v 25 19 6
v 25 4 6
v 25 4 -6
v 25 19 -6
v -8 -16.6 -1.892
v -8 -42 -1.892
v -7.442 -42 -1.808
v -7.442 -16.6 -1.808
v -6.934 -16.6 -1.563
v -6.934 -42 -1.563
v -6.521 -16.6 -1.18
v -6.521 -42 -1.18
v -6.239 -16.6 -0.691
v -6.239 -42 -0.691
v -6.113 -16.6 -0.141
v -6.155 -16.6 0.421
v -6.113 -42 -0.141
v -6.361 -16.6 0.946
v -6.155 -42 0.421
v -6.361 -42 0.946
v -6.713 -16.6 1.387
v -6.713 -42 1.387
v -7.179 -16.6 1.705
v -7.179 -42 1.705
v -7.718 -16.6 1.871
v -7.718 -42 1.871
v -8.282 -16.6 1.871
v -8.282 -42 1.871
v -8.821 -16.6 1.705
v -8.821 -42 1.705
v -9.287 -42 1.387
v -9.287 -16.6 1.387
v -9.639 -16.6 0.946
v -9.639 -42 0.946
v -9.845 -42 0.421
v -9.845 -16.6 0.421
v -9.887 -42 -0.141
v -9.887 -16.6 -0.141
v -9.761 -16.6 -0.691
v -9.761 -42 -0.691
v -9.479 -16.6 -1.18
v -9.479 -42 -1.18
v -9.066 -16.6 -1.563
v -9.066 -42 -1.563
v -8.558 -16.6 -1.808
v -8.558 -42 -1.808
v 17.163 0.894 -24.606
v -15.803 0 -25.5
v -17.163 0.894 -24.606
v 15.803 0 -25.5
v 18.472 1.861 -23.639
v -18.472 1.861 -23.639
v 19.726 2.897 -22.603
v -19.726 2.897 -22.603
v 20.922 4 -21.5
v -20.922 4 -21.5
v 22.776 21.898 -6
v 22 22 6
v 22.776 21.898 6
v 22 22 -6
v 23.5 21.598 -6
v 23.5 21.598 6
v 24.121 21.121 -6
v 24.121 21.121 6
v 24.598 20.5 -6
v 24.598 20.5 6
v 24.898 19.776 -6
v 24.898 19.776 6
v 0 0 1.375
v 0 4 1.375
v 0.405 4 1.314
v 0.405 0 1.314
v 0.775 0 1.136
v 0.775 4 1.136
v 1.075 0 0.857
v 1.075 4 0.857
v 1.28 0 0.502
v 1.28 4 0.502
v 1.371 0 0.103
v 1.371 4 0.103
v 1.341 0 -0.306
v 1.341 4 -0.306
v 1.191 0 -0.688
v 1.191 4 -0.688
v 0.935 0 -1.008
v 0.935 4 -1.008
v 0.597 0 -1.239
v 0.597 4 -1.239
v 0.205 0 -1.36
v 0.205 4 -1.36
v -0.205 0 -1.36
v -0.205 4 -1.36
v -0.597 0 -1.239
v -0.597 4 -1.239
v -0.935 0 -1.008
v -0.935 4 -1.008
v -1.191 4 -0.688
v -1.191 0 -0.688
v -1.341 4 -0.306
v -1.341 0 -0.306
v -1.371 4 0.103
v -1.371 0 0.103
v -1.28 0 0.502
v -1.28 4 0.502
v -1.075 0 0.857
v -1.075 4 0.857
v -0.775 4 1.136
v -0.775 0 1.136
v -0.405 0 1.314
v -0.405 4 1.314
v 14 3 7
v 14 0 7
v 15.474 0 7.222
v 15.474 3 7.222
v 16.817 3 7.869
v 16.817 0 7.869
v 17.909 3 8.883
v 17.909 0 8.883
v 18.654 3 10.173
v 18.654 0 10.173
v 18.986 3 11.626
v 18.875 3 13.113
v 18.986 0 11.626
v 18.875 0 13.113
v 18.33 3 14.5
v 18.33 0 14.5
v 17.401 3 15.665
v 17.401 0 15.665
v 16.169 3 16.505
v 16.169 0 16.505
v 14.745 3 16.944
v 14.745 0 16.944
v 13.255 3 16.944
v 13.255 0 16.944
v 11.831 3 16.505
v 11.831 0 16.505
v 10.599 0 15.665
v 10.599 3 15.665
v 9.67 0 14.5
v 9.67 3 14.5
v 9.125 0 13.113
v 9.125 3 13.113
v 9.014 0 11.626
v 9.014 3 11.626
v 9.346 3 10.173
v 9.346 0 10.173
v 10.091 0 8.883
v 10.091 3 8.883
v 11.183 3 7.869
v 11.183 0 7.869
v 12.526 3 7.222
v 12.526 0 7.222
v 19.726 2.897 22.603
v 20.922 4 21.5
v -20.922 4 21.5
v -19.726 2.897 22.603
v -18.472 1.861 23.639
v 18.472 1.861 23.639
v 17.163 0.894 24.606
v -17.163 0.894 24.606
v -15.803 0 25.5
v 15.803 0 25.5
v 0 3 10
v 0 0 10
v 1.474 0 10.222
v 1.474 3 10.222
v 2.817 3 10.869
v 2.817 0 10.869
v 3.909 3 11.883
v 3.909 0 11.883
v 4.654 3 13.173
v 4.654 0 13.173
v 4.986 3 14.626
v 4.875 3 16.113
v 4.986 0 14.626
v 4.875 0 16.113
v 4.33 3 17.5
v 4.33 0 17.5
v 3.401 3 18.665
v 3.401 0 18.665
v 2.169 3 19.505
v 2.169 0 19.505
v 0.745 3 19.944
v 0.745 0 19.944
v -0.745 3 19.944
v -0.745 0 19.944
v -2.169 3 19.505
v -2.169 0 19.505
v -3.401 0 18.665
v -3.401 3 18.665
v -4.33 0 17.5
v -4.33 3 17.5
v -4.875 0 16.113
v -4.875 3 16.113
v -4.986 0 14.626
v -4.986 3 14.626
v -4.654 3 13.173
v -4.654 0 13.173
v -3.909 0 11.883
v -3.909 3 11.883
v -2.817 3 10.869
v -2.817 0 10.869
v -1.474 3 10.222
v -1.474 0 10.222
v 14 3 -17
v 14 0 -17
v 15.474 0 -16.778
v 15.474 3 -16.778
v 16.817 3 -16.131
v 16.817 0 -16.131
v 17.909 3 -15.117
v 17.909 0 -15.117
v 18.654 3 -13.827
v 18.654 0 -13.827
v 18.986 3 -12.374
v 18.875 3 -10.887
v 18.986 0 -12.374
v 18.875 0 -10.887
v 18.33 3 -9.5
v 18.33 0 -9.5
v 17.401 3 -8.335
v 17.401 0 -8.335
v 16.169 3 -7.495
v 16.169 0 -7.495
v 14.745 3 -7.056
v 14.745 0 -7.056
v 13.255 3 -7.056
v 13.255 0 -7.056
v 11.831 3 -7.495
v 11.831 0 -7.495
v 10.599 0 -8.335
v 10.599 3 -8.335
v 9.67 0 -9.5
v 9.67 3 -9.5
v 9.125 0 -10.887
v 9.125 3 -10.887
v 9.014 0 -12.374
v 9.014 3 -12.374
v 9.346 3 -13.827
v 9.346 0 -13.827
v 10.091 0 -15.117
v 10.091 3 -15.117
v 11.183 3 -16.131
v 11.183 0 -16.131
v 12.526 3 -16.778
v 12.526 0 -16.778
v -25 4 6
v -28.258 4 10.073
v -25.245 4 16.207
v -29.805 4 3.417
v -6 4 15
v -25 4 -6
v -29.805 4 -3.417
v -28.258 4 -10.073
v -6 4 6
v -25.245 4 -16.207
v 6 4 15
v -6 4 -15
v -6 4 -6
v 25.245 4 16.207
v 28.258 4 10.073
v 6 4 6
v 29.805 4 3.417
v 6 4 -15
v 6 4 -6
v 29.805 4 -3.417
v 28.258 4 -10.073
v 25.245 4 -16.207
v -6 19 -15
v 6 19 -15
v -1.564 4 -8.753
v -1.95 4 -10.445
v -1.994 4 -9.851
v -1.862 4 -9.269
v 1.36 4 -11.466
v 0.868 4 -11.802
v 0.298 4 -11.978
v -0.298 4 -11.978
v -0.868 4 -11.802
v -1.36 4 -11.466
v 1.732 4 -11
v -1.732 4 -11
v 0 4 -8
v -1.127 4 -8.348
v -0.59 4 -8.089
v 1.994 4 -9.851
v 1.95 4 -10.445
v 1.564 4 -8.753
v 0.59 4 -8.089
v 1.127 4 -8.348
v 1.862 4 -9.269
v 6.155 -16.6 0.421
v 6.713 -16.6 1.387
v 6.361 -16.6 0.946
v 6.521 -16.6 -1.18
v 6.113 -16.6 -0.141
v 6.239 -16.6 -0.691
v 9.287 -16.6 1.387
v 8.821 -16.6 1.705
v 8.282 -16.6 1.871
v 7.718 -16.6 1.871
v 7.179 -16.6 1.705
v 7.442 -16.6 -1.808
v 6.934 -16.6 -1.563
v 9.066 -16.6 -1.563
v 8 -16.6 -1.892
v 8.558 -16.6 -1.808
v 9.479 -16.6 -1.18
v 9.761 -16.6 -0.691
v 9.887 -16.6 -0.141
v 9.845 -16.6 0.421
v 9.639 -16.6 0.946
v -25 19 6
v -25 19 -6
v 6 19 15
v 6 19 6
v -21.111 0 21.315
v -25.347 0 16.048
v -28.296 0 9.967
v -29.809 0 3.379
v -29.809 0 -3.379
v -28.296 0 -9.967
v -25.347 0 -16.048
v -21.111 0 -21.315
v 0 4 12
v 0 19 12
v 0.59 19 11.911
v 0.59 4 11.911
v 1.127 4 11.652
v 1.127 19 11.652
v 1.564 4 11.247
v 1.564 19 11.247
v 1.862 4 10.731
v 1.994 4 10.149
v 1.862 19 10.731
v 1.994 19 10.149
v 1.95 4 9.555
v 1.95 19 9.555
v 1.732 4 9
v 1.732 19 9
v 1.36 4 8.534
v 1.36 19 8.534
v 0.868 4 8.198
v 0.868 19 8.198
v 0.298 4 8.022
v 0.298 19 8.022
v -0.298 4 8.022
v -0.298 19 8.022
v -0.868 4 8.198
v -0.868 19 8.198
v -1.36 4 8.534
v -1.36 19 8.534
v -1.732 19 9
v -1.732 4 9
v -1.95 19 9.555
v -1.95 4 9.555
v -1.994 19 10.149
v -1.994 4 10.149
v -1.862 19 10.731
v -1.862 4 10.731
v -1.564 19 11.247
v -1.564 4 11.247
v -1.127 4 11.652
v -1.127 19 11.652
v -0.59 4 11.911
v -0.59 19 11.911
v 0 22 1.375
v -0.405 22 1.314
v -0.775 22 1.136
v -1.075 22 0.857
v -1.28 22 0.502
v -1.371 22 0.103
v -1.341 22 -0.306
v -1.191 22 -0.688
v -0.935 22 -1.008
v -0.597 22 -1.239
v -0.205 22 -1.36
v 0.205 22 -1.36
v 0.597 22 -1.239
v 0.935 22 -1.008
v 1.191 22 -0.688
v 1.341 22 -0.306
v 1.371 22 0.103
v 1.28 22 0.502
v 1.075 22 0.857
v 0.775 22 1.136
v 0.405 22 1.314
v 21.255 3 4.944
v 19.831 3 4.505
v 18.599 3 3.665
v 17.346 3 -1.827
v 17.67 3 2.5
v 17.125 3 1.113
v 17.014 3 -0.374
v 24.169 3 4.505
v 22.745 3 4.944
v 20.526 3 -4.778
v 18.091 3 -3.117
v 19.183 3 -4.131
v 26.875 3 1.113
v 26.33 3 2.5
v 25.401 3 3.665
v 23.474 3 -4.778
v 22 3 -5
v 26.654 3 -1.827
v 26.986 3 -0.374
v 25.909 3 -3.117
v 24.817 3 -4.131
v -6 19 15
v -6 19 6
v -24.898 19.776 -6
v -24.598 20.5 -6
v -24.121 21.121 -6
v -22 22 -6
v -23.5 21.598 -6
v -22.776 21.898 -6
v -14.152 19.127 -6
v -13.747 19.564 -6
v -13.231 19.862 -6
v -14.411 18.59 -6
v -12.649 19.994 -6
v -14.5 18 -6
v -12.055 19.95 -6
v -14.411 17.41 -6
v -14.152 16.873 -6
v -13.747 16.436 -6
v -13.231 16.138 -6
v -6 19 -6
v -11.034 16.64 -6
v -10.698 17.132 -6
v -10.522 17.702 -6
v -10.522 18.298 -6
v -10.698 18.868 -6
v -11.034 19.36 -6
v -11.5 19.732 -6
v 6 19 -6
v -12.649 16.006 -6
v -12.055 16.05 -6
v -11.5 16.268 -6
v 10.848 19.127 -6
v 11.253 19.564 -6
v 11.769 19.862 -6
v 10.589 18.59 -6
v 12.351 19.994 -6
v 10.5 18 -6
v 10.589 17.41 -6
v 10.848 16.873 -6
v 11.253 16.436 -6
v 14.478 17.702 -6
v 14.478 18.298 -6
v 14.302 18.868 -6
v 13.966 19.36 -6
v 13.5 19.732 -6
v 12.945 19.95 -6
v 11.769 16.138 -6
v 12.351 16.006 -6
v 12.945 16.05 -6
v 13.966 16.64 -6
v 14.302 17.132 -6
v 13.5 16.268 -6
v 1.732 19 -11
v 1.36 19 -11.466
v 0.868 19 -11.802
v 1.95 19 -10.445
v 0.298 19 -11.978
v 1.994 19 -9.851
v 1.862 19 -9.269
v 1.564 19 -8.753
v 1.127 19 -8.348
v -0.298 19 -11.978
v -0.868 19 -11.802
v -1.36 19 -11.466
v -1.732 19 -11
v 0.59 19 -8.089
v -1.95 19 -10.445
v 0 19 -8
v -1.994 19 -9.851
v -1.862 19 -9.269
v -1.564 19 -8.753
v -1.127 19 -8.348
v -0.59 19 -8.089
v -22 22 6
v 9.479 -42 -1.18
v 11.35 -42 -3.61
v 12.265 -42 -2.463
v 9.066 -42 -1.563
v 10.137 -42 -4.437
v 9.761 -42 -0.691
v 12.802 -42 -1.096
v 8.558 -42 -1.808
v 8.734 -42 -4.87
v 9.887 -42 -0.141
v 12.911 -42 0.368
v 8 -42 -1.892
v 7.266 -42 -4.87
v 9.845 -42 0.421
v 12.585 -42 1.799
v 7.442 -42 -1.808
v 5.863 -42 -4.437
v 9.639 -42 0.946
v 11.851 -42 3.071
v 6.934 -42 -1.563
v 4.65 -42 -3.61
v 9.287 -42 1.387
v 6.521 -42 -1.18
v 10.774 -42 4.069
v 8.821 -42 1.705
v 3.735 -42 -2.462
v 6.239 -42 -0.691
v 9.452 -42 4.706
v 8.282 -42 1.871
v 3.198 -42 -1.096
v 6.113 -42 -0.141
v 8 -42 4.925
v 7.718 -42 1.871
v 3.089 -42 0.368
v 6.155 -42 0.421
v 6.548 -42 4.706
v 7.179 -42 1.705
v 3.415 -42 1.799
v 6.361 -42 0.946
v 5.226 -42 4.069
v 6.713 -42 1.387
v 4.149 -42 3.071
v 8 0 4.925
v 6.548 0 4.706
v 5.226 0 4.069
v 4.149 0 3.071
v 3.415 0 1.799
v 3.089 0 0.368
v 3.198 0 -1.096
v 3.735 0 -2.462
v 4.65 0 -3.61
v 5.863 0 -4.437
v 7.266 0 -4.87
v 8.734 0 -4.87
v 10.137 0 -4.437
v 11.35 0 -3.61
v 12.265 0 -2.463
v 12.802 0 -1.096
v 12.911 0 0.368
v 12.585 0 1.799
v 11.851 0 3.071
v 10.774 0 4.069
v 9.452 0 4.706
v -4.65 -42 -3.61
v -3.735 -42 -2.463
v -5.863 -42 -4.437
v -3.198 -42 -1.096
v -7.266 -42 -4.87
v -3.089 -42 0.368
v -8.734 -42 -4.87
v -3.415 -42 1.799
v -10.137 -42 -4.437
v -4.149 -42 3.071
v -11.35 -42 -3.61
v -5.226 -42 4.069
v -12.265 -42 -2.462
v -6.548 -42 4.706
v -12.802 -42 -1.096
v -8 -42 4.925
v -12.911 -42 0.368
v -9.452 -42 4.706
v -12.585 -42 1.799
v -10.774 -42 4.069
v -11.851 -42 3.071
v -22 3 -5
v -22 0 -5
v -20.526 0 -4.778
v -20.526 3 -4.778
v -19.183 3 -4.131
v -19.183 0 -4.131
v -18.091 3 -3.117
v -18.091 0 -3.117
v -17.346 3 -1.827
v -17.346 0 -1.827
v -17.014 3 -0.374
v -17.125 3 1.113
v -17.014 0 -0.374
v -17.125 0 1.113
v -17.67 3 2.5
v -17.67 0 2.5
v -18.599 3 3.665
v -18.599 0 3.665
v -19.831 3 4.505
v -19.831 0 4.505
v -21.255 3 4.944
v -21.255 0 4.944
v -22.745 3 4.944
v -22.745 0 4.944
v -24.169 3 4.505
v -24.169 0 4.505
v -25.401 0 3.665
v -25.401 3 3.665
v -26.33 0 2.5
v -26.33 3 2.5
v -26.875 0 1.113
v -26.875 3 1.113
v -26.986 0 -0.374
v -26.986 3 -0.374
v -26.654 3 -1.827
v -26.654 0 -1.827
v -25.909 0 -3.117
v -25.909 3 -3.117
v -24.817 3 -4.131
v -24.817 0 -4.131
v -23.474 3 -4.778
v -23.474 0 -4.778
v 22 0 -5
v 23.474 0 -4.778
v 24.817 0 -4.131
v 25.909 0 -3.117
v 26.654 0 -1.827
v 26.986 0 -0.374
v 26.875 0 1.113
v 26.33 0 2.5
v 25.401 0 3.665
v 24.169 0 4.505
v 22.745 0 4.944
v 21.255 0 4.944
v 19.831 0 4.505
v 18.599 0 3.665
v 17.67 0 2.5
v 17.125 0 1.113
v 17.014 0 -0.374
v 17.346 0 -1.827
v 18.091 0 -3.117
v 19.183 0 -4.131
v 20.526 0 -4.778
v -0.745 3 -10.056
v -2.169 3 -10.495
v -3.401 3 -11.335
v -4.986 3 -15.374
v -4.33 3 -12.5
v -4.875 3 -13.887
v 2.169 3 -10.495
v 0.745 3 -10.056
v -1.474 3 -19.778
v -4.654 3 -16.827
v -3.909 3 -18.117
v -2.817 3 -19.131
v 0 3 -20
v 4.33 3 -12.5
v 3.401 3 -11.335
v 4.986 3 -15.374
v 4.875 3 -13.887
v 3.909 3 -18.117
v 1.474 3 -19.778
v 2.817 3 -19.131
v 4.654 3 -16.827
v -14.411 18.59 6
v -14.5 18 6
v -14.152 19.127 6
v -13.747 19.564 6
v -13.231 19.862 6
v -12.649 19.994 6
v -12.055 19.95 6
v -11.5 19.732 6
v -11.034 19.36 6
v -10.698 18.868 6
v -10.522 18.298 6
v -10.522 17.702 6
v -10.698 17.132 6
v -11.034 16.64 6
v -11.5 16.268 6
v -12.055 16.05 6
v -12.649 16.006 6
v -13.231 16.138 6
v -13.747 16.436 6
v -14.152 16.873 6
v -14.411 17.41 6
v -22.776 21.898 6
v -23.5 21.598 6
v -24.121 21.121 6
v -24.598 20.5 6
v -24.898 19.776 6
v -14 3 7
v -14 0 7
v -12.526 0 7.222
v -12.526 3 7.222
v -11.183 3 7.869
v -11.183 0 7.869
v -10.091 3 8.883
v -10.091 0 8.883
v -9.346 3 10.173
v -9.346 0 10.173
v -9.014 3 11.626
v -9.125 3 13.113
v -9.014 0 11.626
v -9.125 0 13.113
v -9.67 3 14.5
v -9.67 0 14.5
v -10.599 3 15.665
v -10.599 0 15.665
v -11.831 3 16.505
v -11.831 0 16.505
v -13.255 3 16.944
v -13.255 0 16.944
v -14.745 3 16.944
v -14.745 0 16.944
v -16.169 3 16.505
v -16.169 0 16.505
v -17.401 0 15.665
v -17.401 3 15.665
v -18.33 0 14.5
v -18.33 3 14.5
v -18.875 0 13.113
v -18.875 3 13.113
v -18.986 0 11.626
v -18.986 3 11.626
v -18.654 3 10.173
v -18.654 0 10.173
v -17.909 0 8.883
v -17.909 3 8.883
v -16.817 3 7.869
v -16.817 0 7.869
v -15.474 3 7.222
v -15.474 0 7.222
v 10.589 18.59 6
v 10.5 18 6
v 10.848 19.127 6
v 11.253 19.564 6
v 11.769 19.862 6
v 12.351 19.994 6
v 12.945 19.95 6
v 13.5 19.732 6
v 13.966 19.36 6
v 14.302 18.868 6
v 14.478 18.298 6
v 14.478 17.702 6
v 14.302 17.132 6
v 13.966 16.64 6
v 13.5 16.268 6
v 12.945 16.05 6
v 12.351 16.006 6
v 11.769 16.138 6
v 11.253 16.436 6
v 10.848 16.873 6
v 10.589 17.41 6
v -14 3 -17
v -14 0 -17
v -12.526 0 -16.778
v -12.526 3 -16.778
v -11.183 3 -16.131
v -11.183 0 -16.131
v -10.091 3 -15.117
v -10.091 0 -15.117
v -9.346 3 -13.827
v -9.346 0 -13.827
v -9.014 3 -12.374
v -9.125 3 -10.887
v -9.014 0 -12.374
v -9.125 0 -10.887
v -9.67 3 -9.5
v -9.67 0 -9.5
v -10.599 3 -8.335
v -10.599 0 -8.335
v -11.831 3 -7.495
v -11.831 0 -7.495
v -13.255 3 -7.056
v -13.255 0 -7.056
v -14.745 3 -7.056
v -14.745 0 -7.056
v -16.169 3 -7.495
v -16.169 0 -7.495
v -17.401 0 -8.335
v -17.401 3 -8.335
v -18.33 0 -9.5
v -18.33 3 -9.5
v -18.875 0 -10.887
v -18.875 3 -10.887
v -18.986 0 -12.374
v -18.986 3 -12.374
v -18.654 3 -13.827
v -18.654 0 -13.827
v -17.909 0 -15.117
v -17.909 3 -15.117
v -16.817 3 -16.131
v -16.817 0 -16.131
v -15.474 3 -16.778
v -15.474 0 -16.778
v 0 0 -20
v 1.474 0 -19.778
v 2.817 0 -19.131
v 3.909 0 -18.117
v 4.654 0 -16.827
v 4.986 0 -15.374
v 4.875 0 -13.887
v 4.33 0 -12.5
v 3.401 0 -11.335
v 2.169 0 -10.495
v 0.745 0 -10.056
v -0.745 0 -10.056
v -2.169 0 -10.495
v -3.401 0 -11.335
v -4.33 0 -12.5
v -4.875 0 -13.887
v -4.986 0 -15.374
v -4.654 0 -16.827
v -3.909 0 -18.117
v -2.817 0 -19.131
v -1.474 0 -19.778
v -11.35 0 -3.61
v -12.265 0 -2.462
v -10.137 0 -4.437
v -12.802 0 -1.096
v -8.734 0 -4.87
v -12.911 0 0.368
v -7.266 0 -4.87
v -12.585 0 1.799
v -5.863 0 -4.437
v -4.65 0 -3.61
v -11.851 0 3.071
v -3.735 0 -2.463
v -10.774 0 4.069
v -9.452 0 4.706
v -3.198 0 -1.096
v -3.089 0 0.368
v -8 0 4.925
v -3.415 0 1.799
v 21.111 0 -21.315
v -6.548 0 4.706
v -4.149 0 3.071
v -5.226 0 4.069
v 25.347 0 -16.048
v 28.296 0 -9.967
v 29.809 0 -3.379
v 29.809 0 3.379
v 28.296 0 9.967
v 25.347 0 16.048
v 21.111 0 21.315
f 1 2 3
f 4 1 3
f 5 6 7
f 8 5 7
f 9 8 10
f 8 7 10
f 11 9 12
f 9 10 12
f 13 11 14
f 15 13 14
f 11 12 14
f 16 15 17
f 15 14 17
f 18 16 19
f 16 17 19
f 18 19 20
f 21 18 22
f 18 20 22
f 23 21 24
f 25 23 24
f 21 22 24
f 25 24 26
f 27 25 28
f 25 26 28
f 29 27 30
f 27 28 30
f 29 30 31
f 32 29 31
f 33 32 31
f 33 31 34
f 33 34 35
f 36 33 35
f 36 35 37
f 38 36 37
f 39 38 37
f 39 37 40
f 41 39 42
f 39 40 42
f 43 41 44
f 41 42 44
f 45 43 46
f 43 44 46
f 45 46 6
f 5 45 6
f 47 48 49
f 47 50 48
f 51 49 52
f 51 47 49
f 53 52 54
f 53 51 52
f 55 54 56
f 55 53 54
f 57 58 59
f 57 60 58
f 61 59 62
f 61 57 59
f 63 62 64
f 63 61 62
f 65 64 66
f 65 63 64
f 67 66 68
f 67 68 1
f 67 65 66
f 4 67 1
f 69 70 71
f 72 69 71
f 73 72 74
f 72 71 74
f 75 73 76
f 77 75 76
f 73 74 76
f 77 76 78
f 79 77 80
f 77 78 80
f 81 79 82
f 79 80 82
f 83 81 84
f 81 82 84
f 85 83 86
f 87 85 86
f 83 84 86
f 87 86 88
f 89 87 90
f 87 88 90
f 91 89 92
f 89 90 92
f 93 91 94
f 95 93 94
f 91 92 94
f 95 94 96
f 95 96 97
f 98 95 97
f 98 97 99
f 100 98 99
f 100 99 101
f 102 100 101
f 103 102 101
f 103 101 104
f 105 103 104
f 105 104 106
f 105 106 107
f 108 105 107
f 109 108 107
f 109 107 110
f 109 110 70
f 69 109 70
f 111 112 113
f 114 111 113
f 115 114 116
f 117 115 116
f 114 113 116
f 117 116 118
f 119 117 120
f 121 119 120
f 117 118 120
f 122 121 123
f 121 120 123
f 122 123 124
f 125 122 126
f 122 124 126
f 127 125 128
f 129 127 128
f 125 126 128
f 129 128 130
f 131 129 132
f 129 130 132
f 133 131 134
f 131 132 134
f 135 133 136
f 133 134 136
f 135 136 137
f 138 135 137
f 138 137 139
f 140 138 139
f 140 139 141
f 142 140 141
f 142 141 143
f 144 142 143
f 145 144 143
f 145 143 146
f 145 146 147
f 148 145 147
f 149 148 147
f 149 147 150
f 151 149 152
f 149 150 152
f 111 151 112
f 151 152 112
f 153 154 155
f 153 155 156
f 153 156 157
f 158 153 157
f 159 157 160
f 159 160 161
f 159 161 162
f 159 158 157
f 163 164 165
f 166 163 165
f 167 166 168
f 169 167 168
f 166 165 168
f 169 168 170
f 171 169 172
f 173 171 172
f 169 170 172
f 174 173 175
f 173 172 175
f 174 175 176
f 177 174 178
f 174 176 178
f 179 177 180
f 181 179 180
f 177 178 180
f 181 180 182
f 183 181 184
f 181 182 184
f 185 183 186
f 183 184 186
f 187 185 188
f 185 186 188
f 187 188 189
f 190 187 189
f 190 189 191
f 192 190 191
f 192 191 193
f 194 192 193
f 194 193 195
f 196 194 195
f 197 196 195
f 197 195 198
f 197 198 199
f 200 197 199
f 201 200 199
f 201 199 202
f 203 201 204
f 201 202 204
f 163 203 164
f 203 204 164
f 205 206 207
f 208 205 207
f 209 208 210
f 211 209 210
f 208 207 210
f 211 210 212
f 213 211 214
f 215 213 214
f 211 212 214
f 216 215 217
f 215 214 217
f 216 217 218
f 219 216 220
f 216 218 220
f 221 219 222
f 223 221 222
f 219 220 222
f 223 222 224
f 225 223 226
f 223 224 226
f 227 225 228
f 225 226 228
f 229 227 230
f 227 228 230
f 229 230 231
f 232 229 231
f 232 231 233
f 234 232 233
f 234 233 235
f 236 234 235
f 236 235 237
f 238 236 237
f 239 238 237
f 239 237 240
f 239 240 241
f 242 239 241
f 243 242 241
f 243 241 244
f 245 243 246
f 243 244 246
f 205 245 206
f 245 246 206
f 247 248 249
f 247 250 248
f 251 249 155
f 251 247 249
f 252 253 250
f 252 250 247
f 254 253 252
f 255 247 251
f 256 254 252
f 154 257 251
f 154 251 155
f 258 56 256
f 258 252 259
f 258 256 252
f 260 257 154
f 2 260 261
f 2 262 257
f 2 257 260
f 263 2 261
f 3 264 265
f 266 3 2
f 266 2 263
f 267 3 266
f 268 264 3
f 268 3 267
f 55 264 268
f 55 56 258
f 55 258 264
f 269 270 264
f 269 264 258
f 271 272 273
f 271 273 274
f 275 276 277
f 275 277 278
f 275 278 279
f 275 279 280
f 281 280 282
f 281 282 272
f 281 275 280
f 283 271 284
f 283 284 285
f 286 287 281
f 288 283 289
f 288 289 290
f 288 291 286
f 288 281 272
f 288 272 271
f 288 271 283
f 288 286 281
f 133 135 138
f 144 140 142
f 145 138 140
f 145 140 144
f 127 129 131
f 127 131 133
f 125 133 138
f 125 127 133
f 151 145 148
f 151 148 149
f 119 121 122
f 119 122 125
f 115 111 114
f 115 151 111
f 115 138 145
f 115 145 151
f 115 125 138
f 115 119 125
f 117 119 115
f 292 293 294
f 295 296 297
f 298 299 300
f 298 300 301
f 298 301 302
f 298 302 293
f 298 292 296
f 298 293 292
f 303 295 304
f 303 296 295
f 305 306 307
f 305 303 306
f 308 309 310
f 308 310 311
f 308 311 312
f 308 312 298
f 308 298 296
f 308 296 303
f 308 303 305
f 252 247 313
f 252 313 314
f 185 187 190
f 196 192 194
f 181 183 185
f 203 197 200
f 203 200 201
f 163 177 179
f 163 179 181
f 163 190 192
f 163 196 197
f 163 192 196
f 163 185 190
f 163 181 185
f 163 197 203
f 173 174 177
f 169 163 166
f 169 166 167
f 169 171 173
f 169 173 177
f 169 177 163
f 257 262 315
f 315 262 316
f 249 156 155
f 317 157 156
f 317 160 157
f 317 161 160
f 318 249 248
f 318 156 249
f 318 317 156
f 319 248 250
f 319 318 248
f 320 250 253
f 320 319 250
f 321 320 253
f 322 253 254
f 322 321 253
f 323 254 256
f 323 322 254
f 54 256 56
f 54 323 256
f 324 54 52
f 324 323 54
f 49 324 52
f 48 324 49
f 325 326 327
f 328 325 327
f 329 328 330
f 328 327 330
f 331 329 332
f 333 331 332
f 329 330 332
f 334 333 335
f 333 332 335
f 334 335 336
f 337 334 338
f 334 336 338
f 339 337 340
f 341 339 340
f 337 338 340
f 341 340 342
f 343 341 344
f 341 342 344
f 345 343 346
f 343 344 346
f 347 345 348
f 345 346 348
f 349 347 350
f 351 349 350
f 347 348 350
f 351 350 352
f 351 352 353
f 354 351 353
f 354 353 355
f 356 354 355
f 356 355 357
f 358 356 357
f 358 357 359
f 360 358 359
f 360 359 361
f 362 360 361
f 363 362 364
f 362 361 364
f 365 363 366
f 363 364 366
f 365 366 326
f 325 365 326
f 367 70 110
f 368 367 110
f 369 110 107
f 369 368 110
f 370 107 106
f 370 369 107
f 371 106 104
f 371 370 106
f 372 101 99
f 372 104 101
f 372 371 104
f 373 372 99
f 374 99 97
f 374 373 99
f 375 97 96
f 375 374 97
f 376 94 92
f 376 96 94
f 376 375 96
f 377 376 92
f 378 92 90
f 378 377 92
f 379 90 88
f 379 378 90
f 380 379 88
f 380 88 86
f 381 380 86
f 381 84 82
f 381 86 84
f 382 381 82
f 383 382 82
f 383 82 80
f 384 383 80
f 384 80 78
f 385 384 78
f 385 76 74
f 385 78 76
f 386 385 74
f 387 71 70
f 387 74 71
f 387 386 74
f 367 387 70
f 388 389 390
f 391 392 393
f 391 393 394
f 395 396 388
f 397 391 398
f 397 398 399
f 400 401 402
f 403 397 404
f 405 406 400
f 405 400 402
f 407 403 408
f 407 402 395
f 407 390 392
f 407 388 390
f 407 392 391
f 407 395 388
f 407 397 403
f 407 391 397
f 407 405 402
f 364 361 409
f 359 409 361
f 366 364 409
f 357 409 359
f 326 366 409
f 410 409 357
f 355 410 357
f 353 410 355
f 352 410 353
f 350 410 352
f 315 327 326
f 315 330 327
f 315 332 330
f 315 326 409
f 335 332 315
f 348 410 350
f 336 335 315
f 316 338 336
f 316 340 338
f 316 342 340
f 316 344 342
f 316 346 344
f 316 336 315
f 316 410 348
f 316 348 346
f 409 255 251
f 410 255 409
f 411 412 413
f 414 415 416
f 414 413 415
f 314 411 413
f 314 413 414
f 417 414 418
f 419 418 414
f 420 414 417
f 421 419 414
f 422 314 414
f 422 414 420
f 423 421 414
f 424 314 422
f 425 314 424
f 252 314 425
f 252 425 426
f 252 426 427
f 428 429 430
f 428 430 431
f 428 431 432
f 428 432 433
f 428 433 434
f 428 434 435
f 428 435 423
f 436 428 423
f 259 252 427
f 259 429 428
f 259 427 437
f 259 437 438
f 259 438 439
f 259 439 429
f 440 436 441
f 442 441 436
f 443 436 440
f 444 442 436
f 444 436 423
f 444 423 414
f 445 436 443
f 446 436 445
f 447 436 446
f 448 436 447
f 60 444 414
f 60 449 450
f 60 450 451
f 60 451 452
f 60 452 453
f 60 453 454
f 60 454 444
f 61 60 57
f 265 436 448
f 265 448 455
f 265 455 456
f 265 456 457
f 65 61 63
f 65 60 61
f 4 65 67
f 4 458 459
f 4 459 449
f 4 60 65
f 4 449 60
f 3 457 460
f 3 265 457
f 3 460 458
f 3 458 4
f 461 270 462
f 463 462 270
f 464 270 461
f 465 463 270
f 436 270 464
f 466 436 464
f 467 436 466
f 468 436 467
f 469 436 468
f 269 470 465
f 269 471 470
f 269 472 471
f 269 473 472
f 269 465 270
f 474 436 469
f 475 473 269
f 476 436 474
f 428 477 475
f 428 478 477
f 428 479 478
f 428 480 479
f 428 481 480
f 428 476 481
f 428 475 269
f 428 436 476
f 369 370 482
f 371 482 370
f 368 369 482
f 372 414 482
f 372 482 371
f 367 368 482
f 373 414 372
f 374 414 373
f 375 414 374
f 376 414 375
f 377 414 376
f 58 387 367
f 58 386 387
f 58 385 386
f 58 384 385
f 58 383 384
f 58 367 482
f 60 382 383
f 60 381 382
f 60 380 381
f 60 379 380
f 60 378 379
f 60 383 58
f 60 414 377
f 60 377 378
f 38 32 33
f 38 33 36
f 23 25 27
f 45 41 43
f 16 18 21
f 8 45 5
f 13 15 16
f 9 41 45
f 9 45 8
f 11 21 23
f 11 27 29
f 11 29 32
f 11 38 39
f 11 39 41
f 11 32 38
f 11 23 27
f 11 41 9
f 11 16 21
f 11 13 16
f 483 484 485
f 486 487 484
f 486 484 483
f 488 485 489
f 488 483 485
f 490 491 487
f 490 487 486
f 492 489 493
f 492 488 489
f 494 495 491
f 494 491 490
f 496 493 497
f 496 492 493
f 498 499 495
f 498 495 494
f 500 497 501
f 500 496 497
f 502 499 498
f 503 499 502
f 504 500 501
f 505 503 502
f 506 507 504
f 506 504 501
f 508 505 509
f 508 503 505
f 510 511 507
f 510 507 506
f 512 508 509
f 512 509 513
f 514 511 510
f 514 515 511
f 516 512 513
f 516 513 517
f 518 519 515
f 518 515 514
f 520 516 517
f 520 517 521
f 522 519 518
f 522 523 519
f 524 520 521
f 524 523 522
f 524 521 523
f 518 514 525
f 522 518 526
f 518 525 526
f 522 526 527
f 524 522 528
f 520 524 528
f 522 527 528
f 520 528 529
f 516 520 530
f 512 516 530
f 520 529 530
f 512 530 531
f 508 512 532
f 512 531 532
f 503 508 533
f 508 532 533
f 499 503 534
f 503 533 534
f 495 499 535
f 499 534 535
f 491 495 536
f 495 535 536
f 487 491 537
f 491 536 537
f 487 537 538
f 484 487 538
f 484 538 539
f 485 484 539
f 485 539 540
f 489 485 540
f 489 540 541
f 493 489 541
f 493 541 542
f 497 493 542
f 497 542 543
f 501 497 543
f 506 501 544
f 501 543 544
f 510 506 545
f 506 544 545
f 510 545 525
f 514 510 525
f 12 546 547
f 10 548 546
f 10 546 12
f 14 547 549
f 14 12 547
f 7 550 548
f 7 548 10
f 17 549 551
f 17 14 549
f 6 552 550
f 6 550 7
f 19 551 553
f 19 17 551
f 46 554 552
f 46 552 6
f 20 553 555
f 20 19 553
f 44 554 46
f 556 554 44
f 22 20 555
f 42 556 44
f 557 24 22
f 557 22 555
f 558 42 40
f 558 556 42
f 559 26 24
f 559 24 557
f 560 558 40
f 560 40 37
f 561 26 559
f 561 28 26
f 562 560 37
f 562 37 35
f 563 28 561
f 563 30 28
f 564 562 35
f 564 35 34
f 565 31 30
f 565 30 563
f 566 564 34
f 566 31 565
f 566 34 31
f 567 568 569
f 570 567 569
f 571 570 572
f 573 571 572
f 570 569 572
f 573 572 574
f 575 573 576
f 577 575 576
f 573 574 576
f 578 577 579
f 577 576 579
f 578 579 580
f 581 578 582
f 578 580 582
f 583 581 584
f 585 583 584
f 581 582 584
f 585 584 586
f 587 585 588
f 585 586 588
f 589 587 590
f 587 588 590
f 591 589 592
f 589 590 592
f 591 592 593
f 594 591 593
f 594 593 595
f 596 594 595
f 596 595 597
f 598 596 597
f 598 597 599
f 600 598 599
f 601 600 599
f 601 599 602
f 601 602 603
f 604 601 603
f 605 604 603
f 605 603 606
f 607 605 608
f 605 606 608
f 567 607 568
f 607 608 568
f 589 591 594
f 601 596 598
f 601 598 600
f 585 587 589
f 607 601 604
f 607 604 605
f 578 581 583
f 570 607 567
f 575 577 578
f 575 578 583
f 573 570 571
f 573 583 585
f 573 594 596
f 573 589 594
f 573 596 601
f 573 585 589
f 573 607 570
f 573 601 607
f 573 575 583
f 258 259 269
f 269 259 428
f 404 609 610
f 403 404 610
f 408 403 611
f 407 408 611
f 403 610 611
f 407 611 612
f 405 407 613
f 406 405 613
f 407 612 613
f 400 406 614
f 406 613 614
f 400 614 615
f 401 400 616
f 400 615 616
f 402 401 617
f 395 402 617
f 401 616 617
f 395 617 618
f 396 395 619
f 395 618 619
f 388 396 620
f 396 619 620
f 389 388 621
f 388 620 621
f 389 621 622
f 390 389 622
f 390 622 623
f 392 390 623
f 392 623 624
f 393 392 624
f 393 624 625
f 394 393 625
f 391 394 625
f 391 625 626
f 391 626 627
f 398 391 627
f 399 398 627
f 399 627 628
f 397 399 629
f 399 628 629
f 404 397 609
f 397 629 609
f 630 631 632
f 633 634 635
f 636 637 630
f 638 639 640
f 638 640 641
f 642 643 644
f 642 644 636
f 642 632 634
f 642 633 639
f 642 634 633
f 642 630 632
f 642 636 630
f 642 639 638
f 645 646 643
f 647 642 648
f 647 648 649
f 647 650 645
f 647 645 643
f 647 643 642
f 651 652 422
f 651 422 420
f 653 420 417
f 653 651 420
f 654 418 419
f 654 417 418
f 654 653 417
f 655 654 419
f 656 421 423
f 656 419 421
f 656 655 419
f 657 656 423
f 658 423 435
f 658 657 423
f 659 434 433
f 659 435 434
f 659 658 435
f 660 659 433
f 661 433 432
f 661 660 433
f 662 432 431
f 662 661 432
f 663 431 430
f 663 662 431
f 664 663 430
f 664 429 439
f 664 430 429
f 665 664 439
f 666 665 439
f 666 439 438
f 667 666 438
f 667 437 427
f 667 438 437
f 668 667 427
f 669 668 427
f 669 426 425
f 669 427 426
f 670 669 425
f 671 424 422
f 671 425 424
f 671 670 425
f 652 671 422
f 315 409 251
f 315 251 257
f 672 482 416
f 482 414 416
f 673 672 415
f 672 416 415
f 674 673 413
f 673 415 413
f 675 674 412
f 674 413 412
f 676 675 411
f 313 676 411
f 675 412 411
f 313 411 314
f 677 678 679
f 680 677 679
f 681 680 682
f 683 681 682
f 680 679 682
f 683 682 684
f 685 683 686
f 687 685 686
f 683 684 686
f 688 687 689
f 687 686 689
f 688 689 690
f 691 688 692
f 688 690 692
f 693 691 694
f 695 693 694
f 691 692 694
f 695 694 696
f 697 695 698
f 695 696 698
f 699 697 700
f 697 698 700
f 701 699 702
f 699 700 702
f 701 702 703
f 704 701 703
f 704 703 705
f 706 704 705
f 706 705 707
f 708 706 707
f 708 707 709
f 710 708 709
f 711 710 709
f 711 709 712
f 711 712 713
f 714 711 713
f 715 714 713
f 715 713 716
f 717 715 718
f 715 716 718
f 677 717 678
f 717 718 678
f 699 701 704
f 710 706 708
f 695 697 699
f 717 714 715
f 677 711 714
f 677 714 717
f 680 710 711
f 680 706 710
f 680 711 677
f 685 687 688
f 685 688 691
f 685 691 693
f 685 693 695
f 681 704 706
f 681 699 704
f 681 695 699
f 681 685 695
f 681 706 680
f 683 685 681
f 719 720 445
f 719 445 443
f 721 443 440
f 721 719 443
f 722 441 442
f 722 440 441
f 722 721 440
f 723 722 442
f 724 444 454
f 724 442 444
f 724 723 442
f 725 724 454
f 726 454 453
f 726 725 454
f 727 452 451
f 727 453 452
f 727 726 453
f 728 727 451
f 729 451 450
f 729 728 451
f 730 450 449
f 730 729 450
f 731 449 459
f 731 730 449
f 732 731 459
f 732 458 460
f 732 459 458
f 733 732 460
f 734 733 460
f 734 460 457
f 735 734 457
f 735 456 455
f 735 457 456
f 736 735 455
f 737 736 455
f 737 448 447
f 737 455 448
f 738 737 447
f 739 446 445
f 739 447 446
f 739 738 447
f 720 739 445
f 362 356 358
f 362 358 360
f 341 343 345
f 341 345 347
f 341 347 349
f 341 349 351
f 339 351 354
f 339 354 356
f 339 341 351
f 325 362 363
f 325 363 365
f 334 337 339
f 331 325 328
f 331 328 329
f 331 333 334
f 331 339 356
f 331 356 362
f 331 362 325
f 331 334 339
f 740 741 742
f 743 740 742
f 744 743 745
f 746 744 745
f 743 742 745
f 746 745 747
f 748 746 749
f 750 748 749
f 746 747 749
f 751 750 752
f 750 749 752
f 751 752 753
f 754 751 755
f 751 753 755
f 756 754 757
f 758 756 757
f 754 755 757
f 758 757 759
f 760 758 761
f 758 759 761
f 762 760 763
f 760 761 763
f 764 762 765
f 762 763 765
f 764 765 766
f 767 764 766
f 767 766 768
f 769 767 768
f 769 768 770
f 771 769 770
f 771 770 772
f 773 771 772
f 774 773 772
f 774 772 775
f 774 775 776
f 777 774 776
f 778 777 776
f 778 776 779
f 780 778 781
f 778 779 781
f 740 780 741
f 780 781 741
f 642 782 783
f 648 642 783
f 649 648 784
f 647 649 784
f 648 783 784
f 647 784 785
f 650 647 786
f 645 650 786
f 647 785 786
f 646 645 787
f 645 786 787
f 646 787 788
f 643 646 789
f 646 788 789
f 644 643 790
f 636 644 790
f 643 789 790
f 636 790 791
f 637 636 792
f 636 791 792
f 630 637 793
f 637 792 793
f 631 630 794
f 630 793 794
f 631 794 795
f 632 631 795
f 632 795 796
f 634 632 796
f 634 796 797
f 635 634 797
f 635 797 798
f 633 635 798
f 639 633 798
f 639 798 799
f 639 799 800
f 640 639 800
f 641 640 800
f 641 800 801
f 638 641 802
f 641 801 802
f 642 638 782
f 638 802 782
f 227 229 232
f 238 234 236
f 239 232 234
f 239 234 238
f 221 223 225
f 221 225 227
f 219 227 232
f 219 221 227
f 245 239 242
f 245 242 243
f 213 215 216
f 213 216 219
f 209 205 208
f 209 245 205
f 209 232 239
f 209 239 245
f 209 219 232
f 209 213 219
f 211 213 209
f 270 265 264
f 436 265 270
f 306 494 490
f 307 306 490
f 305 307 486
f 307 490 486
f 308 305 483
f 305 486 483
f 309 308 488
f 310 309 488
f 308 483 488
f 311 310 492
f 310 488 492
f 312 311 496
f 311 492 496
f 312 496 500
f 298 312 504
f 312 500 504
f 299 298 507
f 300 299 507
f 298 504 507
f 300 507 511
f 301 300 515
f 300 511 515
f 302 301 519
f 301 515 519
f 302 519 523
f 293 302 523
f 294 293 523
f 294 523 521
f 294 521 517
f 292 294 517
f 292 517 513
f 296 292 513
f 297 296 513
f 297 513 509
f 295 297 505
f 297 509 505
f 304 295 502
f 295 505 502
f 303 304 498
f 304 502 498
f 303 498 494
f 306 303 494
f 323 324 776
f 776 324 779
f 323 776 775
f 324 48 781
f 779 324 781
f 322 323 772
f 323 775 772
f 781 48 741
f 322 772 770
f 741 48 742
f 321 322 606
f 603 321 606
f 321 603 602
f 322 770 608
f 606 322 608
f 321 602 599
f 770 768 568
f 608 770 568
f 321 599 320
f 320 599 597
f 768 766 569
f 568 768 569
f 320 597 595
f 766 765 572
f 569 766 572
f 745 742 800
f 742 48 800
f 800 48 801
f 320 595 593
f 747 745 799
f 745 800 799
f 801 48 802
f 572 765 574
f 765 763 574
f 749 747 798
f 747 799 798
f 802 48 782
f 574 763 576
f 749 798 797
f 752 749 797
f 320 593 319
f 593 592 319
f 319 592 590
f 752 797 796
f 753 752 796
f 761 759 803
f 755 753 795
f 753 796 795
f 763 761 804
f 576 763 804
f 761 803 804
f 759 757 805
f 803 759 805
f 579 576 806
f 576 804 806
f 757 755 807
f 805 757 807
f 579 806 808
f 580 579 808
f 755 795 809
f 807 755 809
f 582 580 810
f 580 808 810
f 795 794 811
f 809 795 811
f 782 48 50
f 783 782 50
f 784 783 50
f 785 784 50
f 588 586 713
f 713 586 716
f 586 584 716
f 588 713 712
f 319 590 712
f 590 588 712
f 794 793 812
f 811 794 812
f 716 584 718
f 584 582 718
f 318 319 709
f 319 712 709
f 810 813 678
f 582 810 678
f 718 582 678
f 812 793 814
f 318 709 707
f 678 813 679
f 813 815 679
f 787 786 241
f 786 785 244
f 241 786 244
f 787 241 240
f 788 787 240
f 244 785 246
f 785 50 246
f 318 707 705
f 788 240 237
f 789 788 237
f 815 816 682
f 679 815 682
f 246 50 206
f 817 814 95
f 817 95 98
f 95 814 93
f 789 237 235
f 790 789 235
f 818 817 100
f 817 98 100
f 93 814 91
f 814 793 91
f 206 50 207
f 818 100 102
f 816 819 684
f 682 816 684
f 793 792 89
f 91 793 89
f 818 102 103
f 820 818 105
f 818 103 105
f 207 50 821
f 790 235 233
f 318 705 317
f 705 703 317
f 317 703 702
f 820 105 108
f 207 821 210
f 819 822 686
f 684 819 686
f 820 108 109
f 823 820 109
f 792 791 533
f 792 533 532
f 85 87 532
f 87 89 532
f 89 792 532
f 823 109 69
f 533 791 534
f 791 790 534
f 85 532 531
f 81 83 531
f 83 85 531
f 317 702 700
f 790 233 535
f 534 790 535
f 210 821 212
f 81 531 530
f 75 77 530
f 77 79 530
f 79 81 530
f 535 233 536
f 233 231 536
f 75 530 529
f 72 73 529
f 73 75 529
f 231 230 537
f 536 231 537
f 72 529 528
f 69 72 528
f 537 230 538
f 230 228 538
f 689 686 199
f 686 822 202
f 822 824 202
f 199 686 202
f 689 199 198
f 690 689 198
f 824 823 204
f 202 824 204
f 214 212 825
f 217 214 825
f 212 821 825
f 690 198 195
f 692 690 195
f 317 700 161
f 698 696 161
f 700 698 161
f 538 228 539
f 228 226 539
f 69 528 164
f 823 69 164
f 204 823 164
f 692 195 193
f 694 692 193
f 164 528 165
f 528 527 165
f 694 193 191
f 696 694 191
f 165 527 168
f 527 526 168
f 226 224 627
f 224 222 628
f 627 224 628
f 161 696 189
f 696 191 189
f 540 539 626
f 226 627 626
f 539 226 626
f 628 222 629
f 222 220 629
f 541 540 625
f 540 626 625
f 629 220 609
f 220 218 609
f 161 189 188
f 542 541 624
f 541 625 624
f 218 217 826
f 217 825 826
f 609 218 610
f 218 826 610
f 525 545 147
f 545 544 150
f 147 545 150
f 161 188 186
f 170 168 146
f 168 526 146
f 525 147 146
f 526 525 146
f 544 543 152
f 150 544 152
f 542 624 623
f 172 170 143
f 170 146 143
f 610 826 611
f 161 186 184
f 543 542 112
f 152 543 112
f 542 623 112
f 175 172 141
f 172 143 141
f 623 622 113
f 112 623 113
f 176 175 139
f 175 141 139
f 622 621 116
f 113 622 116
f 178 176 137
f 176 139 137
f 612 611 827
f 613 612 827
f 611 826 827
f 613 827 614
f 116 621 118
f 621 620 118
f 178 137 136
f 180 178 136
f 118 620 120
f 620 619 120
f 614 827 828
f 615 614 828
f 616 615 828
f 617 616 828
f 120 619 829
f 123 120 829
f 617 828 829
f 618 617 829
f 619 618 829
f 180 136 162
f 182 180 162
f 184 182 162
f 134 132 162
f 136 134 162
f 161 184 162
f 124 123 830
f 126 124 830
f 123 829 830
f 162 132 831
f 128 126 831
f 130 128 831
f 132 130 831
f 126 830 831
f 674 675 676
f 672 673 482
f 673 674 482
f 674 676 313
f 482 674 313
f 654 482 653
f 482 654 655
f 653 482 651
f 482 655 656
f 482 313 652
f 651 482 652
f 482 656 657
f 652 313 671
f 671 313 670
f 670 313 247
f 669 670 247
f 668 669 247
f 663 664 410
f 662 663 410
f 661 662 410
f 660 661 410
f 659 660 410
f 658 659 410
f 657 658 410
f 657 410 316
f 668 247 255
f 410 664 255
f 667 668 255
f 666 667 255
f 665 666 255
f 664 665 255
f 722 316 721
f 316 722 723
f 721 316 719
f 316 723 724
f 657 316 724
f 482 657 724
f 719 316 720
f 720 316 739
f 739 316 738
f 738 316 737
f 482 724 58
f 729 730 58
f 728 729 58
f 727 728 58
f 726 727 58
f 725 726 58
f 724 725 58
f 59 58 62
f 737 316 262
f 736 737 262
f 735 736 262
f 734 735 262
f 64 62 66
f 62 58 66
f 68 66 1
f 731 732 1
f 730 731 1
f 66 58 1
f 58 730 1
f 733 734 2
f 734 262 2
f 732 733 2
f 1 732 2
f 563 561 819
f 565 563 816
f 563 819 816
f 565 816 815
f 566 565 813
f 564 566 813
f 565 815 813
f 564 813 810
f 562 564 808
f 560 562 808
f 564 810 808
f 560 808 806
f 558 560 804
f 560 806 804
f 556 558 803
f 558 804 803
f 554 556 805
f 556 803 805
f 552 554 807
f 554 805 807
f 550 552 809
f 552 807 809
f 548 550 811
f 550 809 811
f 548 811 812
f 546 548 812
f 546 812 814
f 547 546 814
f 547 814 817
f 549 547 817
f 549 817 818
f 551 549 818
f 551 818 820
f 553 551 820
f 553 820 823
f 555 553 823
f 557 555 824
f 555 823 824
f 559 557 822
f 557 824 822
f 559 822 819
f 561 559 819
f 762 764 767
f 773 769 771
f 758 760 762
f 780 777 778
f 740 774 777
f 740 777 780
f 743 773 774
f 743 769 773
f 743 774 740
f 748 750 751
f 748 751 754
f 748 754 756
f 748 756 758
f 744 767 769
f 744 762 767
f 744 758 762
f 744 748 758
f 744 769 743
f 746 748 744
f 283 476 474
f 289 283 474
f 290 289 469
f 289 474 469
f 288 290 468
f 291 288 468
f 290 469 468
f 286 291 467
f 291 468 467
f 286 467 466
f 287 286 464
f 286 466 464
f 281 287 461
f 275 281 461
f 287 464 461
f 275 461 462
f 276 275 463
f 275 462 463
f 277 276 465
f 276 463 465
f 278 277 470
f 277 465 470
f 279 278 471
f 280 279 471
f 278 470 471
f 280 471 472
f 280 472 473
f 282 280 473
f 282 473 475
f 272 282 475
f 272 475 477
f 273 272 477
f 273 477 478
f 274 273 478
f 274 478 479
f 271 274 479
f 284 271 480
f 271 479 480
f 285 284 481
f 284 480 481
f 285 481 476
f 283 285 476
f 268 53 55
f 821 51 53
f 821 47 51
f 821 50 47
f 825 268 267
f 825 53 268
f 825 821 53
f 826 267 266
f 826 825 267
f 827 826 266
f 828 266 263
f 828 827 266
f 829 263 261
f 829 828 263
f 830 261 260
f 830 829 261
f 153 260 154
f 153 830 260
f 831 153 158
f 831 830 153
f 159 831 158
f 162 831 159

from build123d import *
from build123d.topology import SkipClean

# Parameters (mm, degrees)
SKETCH1_R                            = 30
BOSS_EXTRUDE1_DEPTH                  = 4
BOSS_EXTRUDE2_REACH                  = 44.615
BOSS_EXTRUDE2_END_RADIUS             = 30
BOSS_EXTRUDE2_DIRECTION_2_REACH      = 44.615
BOSS_EXTRUDE2_DIRECTION_2_END_RADIUS = 30
SKETCH3_OUTSIDE_W                    = 78.092
SKETCH3_OUTSIDE_H                    = 69.092
SKETCH3_OUTSIDE_R                    = 21.5
CUT_EXTRUDE2_DEPTH                   = 12.5
BOSS_EXTRUDE3_DEPTH                  = 18
BOSS_EXTRUDE4_DEPTH                  = 15
BOSS_EXTRUDE5_DEPTH                  = 15
CUT_EXTRUDE3_DEPTH                   = 44.292609069
CUT_EXTRUDE3_DEPTH_BACK              = 44.292609069
SKETCH8_R                            = 2
CUT_EXTRUDE8_DEPTH                   = 48.077064479
CUT_EXTRUDE8_DEPTH_BACK              = 48.077064479
CUT_EXTRUDE9_DEPTH                   = 59.659818207
CUT_EXTRUDE11_DEPTH                  = 20
CUT_EXTRUDE12_DEPTH                  = 20
CUT_EXTRUDE13_DEPTH                  = 20
CUT_EXTRUDE14_DEPTH                  = 44.292609069
CUT_EXTRUDE14_DEPTH_BACK             = 44.292609069
SKETCH25_W                           = 66.075437062
SKETCH25_H                           = 20.142243048
SKETCH27_R                           = 1.375
CUT_EXTRUDE16_DEPTH                  = 30
SKETCH28_R                           = 5
CUT_EXTRUDE17_DEPTH                  = 3
CUT_EXTRUDE18_DEPTH                  = 43.690748412
CUT_EXTRUDE18_DEPTH_BACK             = 43.690748412
SKETCH29_W                           = 43.412566799
SKETCH29_H                           = 13.326200919
SKETCH32_W                           = 50
SKETCH32_H                           = 12
BOSS_EXTRUDE6_DEPTH                  = 18
SKETCH35_W                           = 12
SKETCH35_H                           = 15
BOSS_EXTRUDE7_DEPTH                  = 9
CUT_EXTRUDE19_DEPTH                  = 49.746794766
CUT_EXTRUDE19_DEPTH_BACK             = 49.746794766
SKETCH37_R                           = 2
SKETCH36_R                           = 2
CUT_EXTRUDE20_DEPTH                  = 15
SKETCH39_W                           = 12
SKETCH39_H                           = 15
BOSS_EXTRUDE8_DEPTH                  = 9
SKETCH40_R                           = 2
CUT_EXTRUDE21_DEPTH                  = 15
FILLET1_R                            = 3
FILLET2_R                            = 3
CUT_EXTRUDE24_START                  = -20
SKETCH44_R                           = 1.375
CUT_EXTRUDE24_DEPTH                  = 20
SKETCH45_R                           = 4.925
BOSS_EXTRUDE9_DEPTH                  = 42
SKETCH46_R                           = 1.8923
CUT_EXTRUDE25_DEPTH                  = 25.4
SKETCH47_R                           = 1.8923
CUT_EXTRUDE26_DEPTH                  = 25.4


with BuildPart() as part:
    # Sketch1 → Boss-Extrude1 (new body)
    with BuildSketch(Plane(origin=(0, 0, 0), x_dir=(1, 0, 0), z_dir=(0, 1, 0))):
        with Locations(Location((0, 0, 0), (0, 0, 270))):
            Circle(SKETCH1_R)
    extrude(amount=BOSS_EXTRUDE1_DEPTH)

    # Boss-Extrude2: up to this cylinder (the profile starts inside it)
    with SkipClean():  # the faces are left unmerged after this step: merging them gives an invalid solid
        boss_extrude2_end = Plane(origin=(0, 9.396175, 0), z_dir=(0, -1, 0)) * Cylinder(BOSS_EXTRUDE2_END_RADIUS, 150.23, mode=Mode.PRIVATE)
        # Sketch2 → Boss-Extrude2 (add, up to the surface)
        with BuildSketch(Plane(origin=(0, 0, 0), x_dir=(0, 0, -1), z_dir=(1, 0, 0)), mode=Mode.PRIVATE) as boss_extrude2_sk1:
            Polygon((0, 4), (21.5, 4), (9, 16.5), (-9, 16.5), (-21.5, 4), align=None)
        boss_extrude2_tool1 = extrude(boss_extrude2_sk1.sketch, amount=BOSS_EXTRUDE2_REACH, mode=Mode.PRIVATE) & boss_extrude2_end
        add(boss_extrude2_tool1.solids().sort_by_distance((0, 9.396175, 0))[0])

    # Boss-Extrude2 direction 2: up to this cylinder (the profile starts inside it)
    with SkipClean():  # the faces are left unmerged after this step: merging them gives an invalid solid
        boss_extrude2_direction_2_end = Plane(origin=(0, 9.396175, 0), z_dir=(0, -1, 0)) * Cylinder(BOSS_EXTRUDE2_DIRECTION_2_END_RADIUS, 150.23, mode=Mode.PRIVATE)
        # Sketch2 → Boss-Extrude2 direction 2 (add, up to the surface)
        with BuildSketch(Plane(origin=(0, 0, 0), x_dir=(0, 0, -1), z_dir=(1, 0, 0)), mode=Mode.PRIVATE) as boss_extrude2_direction_2_sk1:
            Polygon((0, 4), (21.5, 4), (9, 16.5), (-9, 16.5), (-21.5, 4), align=None)
        boss_extrude2_direction_2_tool1 = extrude(boss_extrude2_direction_2_sk1.sketch, amount=-BOSS_EXTRUDE2_DIRECTION_2_REACH, mode=Mode.PRIVATE) & boss_extrude2_direction_2_end
        add(boss_extrude2_direction_2_tool1.solids().sort_by_distance((0, 9.396175, 0))[0])

    # SurfaceCut1
    split(bisect_by=Plane(origin=(0, 12.75, -12.75), x_dir=(1, 0, 0), z_dir=(0, 0.7071067811865558, -0.7071067811865392)), keep=Keep.BOTTOM)

    # SurfaceCut2
    split(bisect_by=Plane(origin=(0, 12.75, 12.75), x_dir=(1, 0, 0), z_dir=(0, 0.7071067811865509, 0.7071067811865442)), keep=Keep.BOTTOM)

    # Sketch3 outside → Cut-Extrude2 (cut)
    with BuildSketch(Plane(origin=(0, 4, 0), x_dir=(1, 0, 0), z_dir=(0, 1, 0))):
        Rectangle(SKETCH3_OUTSIDE_W, SKETCH3_OUTSIDE_H)
        Circle(SKETCH3_OUTSIDE_R, mode=Mode.SUBTRACT)
    extrude(amount=CUT_EXTRUDE2_DEPTH, mode=Mode.SUBTRACT)

    # Sketch5 → Boss-Extrude3 (add)
    with BuildSketch(Plane(origin=(0, 0, 0), x_dir=(-1, 0, 0), z_dir=(0, -1, 0))):
        Polygon((0, -6), (-17.5, -6), (-17.5, 6), (17.5, 6), (17.5, -6), align=None)
    extrude(amount=BOSS_EXTRUDE3_DEPTH)

    # Sketch6 → Boss-Extrude4 (add)
    with BuildSketch(Plane.XZ):
        Polygon((0, 15), (7, 15), (7, 6), (-7, 6), (-7, 15), align=None)
    extrude(amount=BOSS_EXTRUDE4_DEPTH)

    # Sketch7 → Boss-Extrude5 (add)
    with BuildSketch(Plane.XZ):
        Polygon((0, -15), (7, -15), (7, -6), (-7, -6), (-7, -15), align=None)
    extrude(amount=BOSS_EXTRUDE5_DEPTH)

    # Sketch8 → Cut-Extrude3 (cut, two sides: drawn at the far end of the back side and taken through both)
    with BuildSketch(Plane.XY.offset(-CUT_EXTRUDE3_DEPTH_BACK)):
        with Locations((-12.5, -12.5)):
            Circle(SKETCH8_R)
        with Locations((12.5, -12.5)):
            Circle(SKETCH8_R)
    extrude(amount=CUT_EXTRUDE3_DEPTH + CUT_EXTRUDE3_DEPTH_BACK, mode=Mode.SUBTRACT)

    # Sketch16 → Cut-Extrude8 (cut, two sides: drawn at the far end of the back side and taken through both)
    with BuildSketch(Plane.XY.offset(6).offset(-CUT_EXTRUDE8_DEPTH_BACK)):
        Polygon((17.5, -18), (17.5, -14.5), (14, -18), align=None)
        Polygon((-17.5, -18), (-14, -18), (-17.5, -14.5), align=None)
    extrude(amount=CUT_EXTRUDE8_DEPTH + CUT_EXTRUDE8_DEPTH_BACK, mode=Mode.SUBTRACT)

    # Sketch17 → Cut-Extrude9 (cut, through all)
    with BuildSketch(Plane(origin=(10.365975269, -9.674910251, -8.062425209), x_dir=(-0.3613483622370374, 0.337258471421235, -0.8693009171531012), z_dir=(0.6355070151731325, -0.5931398808282571, -0.49428323402354774))):
        Polygon((-2.372510104, -6.189601271), (7.980636686, -0.706686759), (7.980636686, -10.965829024), align=None)
    extrude(amount=CUT_EXTRUDE9_DEPTH, mode=Mode.SUBTRACT)

    # Sketch19 → Cut-Extrude11 (cut)
    with BuildSketch(Plane(origin=(-10.365975269, -9.674910251, -8.062425209), x_dir=(0.3613483622370374, 0.33725847142123494, -0.8693009171531012), z_dir=(0.6355070151731324, 0.5931398808282571, 0.4942832340235476))):
        Polygon((-2.372510104, -6.189601271), (7.980636686, -10.965829024), (7.980636686, -0.706686759), align=None)
    extrude(amount=-CUT_EXTRUDE11_DEPTH, mode=Mode.SUBTRACT)

    # Sketch20 → Cut-Extrude12 (cut)
    with BuildSketch(Plane(origin=(-10.365975269, -9.674910251, 8.062425209), x_dir=(-0.3613483622370374, -0.3372584714212349, -0.8693009171531013), z_dir=(0.6355070151731326, 0.593139880828257, -0.49428323402354757))):
        Polygon((2.372510104, -6.189601271), (-7.980636686, -0.706686759), (-7.980636686, -10.965829024), align=None)
    extrude(amount=-CUT_EXTRUDE12_DEPTH, mode=Mode.SUBTRACT)

    # Sketch21 → Cut-Extrude13 (cut)
    with BuildSketch(Plane(origin=(10.365975269, -9.674910251, 8.062425209), x_dir=(-0.3613483622370374, 0.3372584714212349, 0.8693009171531013), z_dir=(-0.6355070151731326, 0.593139880828257, -0.49428323402354757))):
        Polygon((-2.372510104, -6.189601271), (7.980636686, -0.706686759), (7.980636686, -10.965829024), align=None)
    extrude(amount=-CUT_EXTRUDE13_DEPTH, mode=Mode.SUBTRACT)

    # Sketch25 → Cut-Extrude14 (cut, two sides: drawn at the far end of the back side and taken through both)
    with BuildSketch(Plane.XY.offset(-CUT_EXTRUDE14_DEPTH_BACK)):
        with Locations((0, -10.071121524)):
            Rectangle(SKETCH25_W, SKETCH25_H)
    extrude(amount=CUT_EXTRUDE14_DEPTH + CUT_EXTRUDE14_DEPTH_BACK, mode=Mode.SUBTRACT)

    # Sketch27 → Cut-Extrude16 (cut)
    with BuildSketch(Plane(origin=(0, 16.5, 0), x_dir=(1, 0, 0), z_dir=(0, 1, 0))):
        with Locations(Location((0, 0, 0), (0, 0, 270))):
            Circle(SKETCH27_R)
    extrude(amount=-CUT_EXTRUDE16_DEPTH, mode=Mode.SUBTRACT)

    # Sketch28 → Cut-Extrude17 (cut)
    with BuildSketch(Plane.XZ):
        with Locations(Location((0, -15, 0), (0, 0, 270))):
            Circle(SKETCH28_R)
        with Locations(Location((22, 0, 0), (0, 0, 270))):
            Circle(SKETCH28_R)
        with Locations(Location((0, 15, 0), (0, 0, 270))):
            Circle(SKETCH28_R)
        with Locations(Location((-22, 0, 0), (0, 0, 270))):
            Circle(SKETCH28_R)
        with Locations(Location((-14, 12, 0), (0, 0, 270))):
            Circle(SKETCH28_R)
        with Locations(Location((14, 12, 0), (0, 0, 270))):
            Circle(SKETCH28_R)
        with Locations(Location((14, -12, 0), (0, 0, 270))):
            Circle(SKETCH28_R)
        with Locations(Location((-14, -12, 0), (0, 0, 270))):
            Circle(SKETCH28_R)
    extrude(amount=-CUT_EXTRUDE17_DEPTH, mode=Mode.SUBTRACT)

    # Sketch29 → Cut-Extrude18 (cut, two sides: drawn at the far end of the back side and taken through both)
    with BuildSketch(Plane(origin=(0, 0, 0), x_dir=(0, 0, -1), z_dir=(1, 0, 0)).offset(-CUT_EXTRUDE18_DEPTH_BACK)):
        with Locations((0.2062834, 10.66310046)):
            Rectangle(SKETCH29_W, SKETCH29_H)
    extrude(amount=CUT_EXTRUDE18_DEPTH + CUT_EXTRUDE18_DEPTH_BACK, mode=Mode.SUBTRACT)

    # Sketch32 → Boss-Extrude6 (add)
    with BuildSketch(Plane(origin=(0, 4, 0), x_dir=(1, 0, 0), z_dir=(0, 1, 0))):
        Rectangle(SKETCH32_W, SKETCH32_H)
    extrude(amount=BOSS_EXTRUDE6_DEPTH)

    # Sketch35 → Boss-Extrude7 (add)
    with BuildSketch(Plane(origin=(0, 0, -6), x_dir=(-1, 0, 0), z_dir=(0, 0, -1))):
        with Locations((0, 11.5)):
            Rectangle(SKETCH35_W, SKETCH35_H)
    extrude(amount=BOSS_EXTRUDE7_DEPTH)

    # Sketch37 → Cut-Extrude19 (cut, two sides: drawn at the far end of the back side and taken through both)
    with BuildSketch(Plane(origin=(0, 0, -6), x_dir=(-1, 0, 0), z_dir=(0, 0, -1)).offset(-CUT_EXTRUDE19_DEPTH_BACK)):
        with Locations((-12.5, 18)):
            Circle(SKETCH37_R)
        with Locations((12.5, 18)):
            Circle(SKETCH37_R)
    extrude(amount=CUT_EXTRUDE19_DEPTH + CUT_EXTRUDE19_DEPTH_BACK, mode=Mode.SUBTRACT)

    # Sketch36 → Cut-Extrude20 (cut)
    with BuildSketch(Plane(origin=(0, 19, 0), x_dir=(1, 0, 0), z_dir=(0, 1, 0))):
        with Locations(Location((0, 10, 0), (0, 0, 270))):
            Circle(SKETCH36_R)
    extrude(amount=-CUT_EXTRUDE20_DEPTH, mode=Mode.SUBTRACT)

    # Sketch39 → Boss-Extrude8 (add)
    with BuildSketch(Plane.XY.offset(6)):
        with Locations((0, 11.5)):
            Rectangle(SKETCH39_W, SKETCH39_H)
    extrude(amount=BOSS_EXTRUDE8_DEPTH)

    # Sketch40 → Cut-Extrude21 (cut)
    with BuildSketch(Plane(origin=(0, 19, 0), x_dir=(1, 0, 0), z_dir=(0, 1, 0))):
        with Locations(Location((0, -10, 0), (0, 0, 270))):
            Circle(SKETCH40_R)
    extrude(amount=-CUT_EXTRUDE21_DEPTH, mode=Mode.SUBTRACT)

    # Fillet1
    fillet1_edges = [part.edges().sort_by_distance(p)[0] for p in [
        (25, 22, 0),
    ]]
    fillet(fillet1_edges, radius=FILLET1_R)

    # Fillet2
    fillet2_edges = [part.edges().sort_by_distance(p)[0] for p in [
        (-25, 22, 0),
    ]]
    fillet(fillet2_edges, radius=FILLET2_R)

    # Sketch44 → Cut-Extrude24 (cut)
    with BuildSketch(Plane.XZ.offset(-4).offset(CUT_EXTRUDE24_START)):
        with Locations(Location((0, 0, 0), (0, 0, 90))):
            Circle(SKETCH44_R)
    extrude(amount=CUT_EXTRUDE24_DEPTH, mode=Mode.SUBTRACT)

    # Sketch45 → Boss-Extrude9 (add)
    with BuildSketch(Plane.XZ):
        with Locations(Location((-8, 0, 0), (0, 0, 90))):
            Circle(SKETCH45_R)
        with Locations(Location((8, 0, 0), (0, 0, 90))):
            Circle(SKETCH45_R)
    extrude(amount=BOSS_EXTRUDE9_DEPTH)

    # Sketch46 → Cut-Extrude25 (cut)
    with BuildSketch(Plane.XZ.offset(42)):
        with Locations(Location((-8, 0, 0), (0, 0, 270))):
            Circle(SKETCH46_R)
    extrude(amount=-CUT_EXTRUDE25_DEPTH, mode=Mode.SUBTRACT)

    # Sketch47 → Cut-Extrude26 (cut)
    with BuildSketch(Plane.XZ.offset(42)):
        with Locations(Location((8, 0, 0), (0, 0, 270))):
            Circle(SKETCH47_R)
    extrude(amount=-CUT_EXTRUDE26_DEPTH, mode=Mode.SUBTRACT)


solid = part.part
